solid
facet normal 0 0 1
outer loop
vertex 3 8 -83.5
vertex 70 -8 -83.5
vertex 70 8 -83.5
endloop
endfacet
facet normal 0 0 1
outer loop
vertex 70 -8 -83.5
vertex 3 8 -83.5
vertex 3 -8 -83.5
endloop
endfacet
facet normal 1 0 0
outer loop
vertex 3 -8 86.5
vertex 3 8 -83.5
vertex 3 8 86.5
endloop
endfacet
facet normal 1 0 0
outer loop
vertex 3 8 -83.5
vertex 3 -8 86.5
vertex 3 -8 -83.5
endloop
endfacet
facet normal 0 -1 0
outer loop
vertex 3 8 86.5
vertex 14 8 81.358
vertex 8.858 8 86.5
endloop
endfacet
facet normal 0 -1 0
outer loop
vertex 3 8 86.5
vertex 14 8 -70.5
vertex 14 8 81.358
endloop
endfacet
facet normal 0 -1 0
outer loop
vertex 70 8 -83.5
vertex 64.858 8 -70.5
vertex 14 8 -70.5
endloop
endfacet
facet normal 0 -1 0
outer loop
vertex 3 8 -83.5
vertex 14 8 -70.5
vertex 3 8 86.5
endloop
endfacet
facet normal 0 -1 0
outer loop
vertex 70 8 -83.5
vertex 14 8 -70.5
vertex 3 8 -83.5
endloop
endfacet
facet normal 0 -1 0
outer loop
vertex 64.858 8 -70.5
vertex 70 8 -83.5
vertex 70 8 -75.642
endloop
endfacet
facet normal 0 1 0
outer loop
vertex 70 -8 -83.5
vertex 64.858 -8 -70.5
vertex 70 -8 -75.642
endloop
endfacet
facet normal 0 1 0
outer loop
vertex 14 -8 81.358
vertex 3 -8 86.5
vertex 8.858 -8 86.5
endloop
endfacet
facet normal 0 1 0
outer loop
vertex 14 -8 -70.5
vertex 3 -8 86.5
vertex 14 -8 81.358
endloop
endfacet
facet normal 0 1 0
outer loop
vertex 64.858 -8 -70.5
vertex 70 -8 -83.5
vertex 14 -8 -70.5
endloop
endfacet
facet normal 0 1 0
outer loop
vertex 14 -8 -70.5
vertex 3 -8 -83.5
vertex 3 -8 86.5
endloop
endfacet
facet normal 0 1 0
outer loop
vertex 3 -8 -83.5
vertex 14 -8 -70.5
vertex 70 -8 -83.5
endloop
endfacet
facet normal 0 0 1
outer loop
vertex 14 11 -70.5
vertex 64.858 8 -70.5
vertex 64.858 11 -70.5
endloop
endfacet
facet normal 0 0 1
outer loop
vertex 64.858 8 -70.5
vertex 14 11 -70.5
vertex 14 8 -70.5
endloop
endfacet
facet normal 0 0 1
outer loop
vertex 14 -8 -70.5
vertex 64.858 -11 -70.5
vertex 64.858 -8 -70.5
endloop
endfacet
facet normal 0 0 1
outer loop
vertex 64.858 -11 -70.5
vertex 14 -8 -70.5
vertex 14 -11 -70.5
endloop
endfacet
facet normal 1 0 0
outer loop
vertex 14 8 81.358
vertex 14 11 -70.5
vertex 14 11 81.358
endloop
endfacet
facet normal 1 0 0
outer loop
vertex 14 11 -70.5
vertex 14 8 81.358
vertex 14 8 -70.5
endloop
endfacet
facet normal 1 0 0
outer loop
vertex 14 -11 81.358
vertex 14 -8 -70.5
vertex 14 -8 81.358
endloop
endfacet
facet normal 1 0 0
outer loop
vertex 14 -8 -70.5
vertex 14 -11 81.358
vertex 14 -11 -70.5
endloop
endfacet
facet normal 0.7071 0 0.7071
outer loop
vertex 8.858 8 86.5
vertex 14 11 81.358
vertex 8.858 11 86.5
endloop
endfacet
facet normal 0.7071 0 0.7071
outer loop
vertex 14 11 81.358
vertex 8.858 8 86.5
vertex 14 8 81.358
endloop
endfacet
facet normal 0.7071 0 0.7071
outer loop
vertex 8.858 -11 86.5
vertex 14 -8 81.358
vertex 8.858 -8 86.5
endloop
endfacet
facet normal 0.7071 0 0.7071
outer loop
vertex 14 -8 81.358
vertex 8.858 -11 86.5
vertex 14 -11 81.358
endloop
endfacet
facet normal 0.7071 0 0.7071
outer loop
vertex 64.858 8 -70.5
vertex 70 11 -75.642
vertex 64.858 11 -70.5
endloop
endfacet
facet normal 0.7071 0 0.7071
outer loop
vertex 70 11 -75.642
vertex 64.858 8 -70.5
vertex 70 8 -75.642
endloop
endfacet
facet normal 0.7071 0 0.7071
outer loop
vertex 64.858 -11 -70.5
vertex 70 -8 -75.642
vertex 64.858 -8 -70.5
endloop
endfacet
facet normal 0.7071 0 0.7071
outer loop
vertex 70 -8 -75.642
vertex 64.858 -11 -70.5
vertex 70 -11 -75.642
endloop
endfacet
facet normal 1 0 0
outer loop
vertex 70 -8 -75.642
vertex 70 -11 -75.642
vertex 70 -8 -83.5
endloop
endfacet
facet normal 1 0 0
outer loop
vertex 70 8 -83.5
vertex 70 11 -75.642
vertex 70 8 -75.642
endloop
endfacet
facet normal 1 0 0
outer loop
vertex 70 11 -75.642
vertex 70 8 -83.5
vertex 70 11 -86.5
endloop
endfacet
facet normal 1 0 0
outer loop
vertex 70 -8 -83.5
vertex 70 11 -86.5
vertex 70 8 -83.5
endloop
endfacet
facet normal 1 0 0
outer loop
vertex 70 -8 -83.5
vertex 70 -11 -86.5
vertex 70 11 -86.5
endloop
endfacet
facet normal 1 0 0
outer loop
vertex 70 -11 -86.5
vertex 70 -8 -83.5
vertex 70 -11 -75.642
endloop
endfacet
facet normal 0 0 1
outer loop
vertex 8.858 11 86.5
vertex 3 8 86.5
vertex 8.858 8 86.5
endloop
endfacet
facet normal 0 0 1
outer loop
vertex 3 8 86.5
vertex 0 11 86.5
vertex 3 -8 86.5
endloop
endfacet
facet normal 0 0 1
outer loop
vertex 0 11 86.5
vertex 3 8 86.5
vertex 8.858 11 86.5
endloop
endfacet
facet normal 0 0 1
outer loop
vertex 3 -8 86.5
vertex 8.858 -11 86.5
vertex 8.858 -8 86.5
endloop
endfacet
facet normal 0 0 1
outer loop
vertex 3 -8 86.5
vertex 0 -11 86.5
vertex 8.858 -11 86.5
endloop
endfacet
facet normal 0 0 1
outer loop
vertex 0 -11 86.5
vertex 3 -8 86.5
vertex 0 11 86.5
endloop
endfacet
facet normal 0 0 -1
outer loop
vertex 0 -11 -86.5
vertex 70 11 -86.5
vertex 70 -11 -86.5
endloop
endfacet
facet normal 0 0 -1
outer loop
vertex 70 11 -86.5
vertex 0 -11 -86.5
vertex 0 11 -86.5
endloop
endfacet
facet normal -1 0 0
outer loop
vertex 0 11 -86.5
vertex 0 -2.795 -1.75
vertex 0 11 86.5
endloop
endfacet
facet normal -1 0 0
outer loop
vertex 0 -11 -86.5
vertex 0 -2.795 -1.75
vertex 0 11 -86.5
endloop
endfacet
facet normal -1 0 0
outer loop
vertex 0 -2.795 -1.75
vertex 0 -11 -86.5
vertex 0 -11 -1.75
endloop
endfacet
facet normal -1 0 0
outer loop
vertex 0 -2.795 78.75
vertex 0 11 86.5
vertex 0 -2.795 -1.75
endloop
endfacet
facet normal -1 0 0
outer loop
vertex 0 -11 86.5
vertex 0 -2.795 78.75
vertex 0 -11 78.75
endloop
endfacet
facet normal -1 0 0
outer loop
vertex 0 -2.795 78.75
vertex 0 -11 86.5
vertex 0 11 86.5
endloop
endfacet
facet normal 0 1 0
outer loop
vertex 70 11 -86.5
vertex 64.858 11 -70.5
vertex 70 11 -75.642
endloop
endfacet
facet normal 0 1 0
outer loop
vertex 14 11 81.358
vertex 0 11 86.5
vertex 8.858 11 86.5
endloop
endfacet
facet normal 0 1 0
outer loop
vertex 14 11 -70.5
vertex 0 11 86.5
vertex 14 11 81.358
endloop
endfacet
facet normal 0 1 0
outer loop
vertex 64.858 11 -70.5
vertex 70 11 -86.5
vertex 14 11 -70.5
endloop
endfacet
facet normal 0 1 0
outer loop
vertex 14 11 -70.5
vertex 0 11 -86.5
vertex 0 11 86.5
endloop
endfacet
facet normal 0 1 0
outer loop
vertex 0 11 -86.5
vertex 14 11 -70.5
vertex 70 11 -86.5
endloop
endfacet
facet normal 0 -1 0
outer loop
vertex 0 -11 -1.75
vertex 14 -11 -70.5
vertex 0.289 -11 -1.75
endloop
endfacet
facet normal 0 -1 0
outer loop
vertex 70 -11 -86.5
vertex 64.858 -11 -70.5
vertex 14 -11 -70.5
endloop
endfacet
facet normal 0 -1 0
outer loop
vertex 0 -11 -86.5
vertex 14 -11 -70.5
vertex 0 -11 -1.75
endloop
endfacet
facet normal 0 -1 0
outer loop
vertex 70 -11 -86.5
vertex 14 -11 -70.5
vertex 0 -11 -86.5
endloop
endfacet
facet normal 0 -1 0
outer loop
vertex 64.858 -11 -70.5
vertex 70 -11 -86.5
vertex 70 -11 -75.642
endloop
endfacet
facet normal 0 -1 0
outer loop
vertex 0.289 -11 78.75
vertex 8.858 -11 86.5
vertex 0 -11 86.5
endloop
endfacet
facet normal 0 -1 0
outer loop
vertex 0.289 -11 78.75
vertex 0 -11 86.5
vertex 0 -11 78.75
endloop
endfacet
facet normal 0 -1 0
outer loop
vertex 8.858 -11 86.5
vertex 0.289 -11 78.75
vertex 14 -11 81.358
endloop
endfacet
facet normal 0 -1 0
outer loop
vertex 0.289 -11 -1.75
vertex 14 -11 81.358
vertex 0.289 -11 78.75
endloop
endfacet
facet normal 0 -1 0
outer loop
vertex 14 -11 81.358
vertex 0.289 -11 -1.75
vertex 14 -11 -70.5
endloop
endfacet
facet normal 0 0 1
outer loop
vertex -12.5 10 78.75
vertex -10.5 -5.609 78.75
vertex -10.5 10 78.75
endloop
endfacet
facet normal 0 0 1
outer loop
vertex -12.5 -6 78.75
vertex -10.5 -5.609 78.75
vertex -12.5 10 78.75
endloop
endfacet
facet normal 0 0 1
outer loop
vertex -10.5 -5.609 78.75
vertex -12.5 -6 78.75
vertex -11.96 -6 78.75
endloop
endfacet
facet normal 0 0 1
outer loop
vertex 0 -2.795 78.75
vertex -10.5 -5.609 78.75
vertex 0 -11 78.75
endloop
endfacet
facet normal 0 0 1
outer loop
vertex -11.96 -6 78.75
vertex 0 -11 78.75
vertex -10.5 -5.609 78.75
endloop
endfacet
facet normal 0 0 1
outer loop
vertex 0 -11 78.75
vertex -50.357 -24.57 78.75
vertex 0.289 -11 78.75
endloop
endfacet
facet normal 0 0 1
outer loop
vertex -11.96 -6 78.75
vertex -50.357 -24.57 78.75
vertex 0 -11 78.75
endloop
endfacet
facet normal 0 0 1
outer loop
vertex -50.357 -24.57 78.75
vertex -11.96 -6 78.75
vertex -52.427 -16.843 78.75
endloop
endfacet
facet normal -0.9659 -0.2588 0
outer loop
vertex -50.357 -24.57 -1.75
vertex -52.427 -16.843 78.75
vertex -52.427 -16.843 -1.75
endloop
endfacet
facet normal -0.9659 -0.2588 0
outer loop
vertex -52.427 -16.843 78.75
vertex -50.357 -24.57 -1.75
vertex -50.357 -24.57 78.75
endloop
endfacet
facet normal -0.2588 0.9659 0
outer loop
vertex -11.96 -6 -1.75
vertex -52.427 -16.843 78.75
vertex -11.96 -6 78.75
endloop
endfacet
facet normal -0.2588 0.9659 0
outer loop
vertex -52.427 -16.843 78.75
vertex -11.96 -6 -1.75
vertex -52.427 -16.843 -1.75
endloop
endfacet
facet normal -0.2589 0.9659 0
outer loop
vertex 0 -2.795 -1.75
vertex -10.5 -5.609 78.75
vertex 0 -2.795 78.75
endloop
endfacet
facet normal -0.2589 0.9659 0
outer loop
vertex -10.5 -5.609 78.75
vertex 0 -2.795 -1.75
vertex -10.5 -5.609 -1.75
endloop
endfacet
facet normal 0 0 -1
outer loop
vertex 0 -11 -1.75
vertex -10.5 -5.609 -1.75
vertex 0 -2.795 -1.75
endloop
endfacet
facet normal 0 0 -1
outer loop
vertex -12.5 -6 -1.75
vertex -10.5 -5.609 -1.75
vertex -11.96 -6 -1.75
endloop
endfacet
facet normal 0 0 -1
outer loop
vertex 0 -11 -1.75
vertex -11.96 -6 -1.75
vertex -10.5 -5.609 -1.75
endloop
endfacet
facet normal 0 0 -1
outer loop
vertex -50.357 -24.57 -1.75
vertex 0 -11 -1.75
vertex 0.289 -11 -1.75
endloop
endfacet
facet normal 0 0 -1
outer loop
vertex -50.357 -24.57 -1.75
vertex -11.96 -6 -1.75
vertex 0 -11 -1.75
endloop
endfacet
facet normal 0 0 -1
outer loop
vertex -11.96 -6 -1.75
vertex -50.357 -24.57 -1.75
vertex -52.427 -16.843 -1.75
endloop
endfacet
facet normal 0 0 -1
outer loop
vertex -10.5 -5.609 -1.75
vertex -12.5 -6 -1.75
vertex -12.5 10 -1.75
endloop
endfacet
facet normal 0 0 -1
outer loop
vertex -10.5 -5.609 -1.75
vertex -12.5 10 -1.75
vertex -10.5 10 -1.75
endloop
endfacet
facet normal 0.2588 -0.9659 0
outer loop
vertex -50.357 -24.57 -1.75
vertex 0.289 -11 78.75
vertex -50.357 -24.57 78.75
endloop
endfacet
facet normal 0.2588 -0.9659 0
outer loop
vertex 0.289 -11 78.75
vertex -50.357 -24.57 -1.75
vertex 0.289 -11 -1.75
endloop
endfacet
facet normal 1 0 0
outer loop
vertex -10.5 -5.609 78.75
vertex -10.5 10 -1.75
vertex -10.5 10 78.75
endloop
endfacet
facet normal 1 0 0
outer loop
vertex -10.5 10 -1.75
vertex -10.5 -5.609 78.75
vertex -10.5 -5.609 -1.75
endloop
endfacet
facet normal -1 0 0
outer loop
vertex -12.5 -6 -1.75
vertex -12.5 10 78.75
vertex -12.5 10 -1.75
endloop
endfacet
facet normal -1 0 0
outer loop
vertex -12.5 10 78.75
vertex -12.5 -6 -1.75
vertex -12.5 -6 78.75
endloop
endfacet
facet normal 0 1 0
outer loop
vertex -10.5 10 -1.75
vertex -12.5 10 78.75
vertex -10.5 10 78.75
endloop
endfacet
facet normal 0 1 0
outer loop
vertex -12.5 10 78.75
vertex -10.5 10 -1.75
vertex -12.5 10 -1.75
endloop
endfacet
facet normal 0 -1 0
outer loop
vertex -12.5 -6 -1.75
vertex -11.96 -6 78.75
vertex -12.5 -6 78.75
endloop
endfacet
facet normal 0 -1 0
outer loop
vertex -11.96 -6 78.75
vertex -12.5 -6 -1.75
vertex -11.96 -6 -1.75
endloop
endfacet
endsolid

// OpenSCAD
t_th = 16;
w_th = 3;
base=173;


module frame() {
  translate([70/2, 0, 0]) {
    difference() {
      cube([70, t_th+w_th*2, base], center=true);
      union() {
        translate([w_th, 0, w_th])
          cube([70, t_th, base], center=true);  // "Tablet body"
        translate([14, 0, 16])
          cube([70, t_th+w_th*2+2, base], center=true); // Inner part of frame
        // Corners
        translate([-12, 0, +base/2+20-20])
          rotate([0, 45, 0])
            cube([20, t_th+w_th*2+2, 20], center=true);
        translate([70/2+5, 0, -base/2+20])
          rotate([0, 45, 0])
            cube([20, t_th+w_th*2+2, 20], center=true);
      }
    }
  }
}

frame();
rotate([0, 0, 15])
  translate([-55/2, -t_th/2+1.3, 125-base/2]) 
    cube([55, 8, 80.5], center=true);
translate([-2/2-10.5, 2, 125-base/2])   
    cube([2, 16, 80.5], center=true);
